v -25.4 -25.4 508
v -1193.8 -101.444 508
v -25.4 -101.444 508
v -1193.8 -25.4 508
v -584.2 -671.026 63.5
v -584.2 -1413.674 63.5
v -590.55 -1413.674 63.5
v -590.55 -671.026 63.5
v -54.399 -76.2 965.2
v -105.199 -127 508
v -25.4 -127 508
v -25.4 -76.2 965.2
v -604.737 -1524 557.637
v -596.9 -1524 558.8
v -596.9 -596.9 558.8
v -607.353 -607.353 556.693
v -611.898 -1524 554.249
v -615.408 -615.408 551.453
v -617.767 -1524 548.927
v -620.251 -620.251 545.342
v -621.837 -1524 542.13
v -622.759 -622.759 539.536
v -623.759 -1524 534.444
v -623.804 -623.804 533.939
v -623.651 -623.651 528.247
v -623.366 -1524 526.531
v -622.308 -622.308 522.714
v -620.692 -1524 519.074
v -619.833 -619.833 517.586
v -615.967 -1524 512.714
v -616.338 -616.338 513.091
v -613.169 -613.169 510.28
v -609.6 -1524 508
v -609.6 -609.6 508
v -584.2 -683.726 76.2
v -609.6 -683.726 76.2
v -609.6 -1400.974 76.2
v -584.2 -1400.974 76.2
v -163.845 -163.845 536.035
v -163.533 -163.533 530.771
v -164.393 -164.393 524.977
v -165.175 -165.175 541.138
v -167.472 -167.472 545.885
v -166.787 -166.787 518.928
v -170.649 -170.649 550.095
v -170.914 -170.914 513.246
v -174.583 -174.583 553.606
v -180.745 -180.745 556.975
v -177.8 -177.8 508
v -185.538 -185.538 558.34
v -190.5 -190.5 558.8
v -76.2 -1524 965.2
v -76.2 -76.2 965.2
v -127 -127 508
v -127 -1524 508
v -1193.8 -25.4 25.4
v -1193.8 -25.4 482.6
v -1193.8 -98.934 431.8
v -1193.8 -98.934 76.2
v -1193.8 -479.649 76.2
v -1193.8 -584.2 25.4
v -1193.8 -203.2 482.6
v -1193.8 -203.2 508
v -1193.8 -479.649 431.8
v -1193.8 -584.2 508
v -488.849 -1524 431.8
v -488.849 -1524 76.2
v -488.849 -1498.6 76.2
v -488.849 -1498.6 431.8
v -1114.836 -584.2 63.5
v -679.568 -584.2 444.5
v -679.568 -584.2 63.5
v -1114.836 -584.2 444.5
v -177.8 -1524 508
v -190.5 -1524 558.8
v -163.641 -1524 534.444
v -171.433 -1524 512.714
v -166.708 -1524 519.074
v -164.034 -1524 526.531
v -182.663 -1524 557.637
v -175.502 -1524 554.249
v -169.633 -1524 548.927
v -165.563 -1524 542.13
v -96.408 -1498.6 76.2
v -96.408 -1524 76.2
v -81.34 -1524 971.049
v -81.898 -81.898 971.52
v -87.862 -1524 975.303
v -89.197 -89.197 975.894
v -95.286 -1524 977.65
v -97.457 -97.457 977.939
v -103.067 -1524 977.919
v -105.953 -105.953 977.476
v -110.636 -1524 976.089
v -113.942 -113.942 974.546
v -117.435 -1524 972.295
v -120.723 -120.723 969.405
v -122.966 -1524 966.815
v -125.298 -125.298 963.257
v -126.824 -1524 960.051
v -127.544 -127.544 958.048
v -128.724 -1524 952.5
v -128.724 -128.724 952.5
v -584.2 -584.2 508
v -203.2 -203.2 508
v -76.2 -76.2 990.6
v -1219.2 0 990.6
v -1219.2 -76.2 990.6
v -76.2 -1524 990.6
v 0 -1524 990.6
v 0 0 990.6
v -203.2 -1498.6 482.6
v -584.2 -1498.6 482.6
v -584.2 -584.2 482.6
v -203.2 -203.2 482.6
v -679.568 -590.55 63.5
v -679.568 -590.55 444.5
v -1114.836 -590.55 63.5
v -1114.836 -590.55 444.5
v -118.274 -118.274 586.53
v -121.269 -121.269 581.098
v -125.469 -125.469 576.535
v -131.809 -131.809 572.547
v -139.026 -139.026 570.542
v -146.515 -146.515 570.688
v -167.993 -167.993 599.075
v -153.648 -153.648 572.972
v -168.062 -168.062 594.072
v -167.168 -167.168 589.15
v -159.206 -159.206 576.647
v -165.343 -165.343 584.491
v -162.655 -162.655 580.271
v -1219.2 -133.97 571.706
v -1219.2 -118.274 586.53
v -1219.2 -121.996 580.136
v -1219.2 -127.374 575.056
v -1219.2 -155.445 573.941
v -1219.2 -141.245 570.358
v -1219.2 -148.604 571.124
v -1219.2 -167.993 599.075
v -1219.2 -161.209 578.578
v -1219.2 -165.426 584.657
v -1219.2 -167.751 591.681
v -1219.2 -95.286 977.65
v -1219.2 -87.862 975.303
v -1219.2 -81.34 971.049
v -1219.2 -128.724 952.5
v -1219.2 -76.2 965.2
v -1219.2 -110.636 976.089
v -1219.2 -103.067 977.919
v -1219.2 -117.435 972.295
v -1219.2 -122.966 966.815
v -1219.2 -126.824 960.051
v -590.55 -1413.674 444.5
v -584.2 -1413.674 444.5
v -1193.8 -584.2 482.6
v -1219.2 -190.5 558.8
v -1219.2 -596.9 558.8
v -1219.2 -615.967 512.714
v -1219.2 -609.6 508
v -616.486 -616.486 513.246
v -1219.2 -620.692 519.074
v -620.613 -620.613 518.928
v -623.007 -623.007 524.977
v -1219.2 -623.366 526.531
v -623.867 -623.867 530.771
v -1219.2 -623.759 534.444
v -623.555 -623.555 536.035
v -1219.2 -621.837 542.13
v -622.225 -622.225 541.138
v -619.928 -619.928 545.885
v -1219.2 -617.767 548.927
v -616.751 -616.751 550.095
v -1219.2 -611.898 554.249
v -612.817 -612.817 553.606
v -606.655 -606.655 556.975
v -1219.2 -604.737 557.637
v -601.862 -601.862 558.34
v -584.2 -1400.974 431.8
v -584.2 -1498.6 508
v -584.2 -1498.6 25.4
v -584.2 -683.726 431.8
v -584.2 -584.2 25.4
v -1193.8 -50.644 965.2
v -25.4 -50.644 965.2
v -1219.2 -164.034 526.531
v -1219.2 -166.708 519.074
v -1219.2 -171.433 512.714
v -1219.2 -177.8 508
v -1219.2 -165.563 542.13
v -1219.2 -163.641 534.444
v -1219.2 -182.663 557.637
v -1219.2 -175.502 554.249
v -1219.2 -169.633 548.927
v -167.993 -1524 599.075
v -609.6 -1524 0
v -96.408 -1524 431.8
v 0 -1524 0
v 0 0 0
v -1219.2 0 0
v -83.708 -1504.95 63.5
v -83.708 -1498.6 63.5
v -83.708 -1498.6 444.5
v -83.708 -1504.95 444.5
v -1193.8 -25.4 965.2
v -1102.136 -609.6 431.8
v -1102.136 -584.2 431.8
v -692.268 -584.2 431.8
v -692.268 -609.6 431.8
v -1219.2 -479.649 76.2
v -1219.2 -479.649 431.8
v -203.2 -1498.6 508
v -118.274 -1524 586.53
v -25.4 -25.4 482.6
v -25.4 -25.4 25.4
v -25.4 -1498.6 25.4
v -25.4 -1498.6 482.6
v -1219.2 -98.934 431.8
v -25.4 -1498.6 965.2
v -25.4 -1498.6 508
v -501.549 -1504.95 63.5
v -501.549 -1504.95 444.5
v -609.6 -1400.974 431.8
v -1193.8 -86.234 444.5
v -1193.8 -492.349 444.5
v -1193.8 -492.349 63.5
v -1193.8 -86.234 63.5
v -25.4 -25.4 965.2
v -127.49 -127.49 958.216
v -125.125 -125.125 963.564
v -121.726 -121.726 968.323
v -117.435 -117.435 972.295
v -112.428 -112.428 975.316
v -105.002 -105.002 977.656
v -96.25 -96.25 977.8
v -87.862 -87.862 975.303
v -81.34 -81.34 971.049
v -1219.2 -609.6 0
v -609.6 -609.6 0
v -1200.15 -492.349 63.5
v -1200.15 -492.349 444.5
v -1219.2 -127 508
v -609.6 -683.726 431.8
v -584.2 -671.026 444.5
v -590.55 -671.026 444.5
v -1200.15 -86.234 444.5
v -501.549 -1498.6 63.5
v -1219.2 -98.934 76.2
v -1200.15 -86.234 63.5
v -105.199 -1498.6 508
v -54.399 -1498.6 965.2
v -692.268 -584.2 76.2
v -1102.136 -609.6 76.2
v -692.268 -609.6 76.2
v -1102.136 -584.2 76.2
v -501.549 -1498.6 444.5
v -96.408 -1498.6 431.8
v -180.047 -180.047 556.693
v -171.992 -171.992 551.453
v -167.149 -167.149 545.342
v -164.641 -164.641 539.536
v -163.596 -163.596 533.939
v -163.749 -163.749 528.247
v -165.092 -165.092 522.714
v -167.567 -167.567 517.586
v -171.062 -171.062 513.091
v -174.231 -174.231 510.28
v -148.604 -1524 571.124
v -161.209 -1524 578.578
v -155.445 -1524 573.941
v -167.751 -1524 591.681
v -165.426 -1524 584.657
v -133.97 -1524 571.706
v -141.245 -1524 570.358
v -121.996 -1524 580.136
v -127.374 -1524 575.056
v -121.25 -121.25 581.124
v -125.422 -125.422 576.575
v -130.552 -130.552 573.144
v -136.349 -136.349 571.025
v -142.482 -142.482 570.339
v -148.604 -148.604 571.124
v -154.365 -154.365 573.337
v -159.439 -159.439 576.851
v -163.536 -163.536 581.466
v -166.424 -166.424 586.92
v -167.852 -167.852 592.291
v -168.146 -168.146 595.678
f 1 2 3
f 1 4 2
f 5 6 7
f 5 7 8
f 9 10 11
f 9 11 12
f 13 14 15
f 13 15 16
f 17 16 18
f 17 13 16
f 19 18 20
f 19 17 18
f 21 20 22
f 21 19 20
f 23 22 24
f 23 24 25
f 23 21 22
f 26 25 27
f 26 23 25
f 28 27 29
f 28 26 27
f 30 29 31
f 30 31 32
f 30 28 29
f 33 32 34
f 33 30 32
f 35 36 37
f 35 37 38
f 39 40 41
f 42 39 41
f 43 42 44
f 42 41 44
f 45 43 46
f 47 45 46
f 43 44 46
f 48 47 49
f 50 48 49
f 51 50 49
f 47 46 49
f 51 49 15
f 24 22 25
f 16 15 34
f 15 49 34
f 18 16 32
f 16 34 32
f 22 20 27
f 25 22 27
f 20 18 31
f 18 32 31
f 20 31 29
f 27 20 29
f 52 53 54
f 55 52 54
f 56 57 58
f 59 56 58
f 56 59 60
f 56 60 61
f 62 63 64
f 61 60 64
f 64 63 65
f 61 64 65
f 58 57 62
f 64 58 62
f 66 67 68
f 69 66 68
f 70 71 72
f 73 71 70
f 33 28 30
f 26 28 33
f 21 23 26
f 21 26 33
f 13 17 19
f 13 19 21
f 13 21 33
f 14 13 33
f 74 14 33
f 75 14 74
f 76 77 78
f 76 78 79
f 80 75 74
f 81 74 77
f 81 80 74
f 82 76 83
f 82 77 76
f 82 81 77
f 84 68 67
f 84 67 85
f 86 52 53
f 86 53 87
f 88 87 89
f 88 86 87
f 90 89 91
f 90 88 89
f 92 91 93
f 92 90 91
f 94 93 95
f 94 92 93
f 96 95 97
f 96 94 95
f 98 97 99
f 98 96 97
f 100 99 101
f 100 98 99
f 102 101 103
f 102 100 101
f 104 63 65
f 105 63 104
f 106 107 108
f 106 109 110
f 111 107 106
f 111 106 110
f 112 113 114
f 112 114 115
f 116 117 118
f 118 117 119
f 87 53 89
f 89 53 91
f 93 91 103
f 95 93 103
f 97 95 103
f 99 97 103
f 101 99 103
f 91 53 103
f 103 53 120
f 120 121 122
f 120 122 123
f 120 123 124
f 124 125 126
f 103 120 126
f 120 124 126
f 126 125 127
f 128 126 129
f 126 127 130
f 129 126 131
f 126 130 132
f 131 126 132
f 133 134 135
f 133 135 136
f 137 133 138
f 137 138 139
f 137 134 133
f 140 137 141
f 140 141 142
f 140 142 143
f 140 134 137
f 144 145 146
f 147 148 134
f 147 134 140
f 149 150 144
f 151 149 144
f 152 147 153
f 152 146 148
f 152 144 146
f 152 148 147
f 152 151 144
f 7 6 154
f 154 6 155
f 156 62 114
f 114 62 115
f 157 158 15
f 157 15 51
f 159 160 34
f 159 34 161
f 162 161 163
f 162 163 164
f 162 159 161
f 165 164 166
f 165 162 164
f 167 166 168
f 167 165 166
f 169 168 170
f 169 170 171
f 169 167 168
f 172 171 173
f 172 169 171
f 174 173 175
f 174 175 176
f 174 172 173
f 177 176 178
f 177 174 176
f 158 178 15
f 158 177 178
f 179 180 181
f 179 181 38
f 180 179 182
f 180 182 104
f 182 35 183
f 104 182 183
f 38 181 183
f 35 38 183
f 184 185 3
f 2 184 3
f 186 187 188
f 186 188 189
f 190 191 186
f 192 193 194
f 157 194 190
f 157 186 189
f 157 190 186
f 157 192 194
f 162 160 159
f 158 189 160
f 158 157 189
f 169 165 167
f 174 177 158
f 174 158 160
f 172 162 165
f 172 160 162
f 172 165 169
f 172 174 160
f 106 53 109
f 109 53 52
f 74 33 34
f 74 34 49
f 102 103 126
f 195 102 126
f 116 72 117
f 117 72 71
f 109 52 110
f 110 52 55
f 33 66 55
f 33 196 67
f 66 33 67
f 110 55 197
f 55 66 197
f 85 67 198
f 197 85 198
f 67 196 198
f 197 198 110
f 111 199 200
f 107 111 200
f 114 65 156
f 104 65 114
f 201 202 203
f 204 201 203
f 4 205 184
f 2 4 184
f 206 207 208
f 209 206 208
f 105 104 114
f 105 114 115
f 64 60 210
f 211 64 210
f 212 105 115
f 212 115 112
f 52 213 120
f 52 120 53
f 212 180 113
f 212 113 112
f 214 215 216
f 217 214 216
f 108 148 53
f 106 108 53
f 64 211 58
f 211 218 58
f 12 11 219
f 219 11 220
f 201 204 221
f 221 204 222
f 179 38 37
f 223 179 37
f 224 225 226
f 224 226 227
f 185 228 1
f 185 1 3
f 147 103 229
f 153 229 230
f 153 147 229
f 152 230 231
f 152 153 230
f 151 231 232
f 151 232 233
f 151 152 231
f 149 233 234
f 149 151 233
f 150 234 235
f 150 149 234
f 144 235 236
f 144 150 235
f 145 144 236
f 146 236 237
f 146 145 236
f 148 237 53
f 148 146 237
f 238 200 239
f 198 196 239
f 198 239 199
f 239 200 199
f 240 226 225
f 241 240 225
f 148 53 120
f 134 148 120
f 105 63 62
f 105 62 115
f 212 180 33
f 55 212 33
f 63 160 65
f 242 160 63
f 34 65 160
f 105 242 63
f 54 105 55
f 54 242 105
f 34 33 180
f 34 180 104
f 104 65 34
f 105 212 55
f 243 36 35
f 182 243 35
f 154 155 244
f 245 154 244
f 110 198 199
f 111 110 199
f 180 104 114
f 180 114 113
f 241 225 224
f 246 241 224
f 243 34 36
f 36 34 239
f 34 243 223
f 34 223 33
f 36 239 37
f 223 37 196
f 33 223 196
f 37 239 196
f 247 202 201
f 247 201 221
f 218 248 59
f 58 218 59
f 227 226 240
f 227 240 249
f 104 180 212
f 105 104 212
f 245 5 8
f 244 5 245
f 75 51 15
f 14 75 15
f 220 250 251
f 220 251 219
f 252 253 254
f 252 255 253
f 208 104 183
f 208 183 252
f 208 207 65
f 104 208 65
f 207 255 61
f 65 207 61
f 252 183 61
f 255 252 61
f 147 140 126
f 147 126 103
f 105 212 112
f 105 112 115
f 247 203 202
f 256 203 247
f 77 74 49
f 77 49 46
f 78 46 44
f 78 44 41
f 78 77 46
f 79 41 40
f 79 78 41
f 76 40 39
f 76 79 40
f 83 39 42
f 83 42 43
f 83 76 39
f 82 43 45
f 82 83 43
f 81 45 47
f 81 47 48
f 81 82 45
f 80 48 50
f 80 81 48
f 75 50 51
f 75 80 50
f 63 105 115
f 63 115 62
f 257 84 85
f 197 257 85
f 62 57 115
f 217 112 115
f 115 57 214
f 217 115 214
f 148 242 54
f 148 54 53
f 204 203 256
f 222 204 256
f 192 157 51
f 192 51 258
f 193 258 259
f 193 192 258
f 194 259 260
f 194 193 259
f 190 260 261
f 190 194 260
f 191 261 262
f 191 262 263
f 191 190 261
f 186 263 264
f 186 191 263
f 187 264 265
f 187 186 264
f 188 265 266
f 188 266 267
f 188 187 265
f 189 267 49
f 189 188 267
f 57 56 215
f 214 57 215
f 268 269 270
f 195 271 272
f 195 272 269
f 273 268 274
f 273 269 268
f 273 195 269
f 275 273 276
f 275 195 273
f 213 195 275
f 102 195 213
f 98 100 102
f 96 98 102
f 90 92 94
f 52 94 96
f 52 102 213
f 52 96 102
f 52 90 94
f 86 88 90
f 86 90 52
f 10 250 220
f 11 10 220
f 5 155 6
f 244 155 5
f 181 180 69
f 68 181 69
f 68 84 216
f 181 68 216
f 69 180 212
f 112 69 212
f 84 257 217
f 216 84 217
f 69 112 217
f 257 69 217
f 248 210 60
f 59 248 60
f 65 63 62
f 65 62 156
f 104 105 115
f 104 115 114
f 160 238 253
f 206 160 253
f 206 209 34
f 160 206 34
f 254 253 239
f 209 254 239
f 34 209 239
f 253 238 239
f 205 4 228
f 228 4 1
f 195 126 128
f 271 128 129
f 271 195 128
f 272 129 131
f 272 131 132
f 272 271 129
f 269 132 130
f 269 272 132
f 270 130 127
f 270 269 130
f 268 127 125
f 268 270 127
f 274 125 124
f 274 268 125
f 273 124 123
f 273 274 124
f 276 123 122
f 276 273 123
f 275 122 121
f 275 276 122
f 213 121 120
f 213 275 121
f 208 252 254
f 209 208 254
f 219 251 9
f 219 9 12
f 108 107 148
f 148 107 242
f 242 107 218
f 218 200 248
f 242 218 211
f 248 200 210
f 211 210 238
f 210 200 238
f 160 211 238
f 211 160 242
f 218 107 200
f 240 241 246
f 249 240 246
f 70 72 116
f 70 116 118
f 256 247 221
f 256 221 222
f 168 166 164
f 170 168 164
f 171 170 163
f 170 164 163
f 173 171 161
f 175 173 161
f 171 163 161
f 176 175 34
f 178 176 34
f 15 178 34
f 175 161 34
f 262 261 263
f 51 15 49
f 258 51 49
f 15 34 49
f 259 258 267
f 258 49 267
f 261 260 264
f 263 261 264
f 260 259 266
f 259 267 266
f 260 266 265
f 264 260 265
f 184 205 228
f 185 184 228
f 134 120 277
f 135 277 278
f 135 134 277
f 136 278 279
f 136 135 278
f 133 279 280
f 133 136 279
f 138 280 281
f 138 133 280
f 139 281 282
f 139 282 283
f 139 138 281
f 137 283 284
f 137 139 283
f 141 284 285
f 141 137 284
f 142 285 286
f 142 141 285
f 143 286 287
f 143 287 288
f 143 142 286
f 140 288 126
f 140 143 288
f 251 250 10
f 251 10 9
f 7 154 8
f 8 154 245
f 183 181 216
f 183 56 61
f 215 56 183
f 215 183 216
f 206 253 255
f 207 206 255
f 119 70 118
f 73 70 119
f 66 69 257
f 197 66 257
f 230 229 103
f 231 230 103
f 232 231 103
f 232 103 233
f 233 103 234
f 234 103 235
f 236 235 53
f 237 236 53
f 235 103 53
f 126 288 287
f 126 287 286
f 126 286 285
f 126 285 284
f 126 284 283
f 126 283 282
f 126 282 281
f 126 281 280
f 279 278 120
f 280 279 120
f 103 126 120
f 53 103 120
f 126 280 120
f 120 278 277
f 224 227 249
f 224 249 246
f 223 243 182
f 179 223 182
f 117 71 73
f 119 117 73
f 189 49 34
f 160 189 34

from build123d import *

# Parameters (mm, degrees)
F1_DEPTH  = 76.2
F2_DEPTH  = 25.4
F3_W      = 1168.4
F3_H      = 25.4
F4_DEPTH  = 889
F5_DEPTH  = 355.6
F7_DEPTH  = 76.2
F9_DEPTH  = 25.4
F11_DEPTH = 25.4
F13_DEPTH = 25.4
F14_DEPTH = 1193.8
F15_REACH = 1986.929480867
F16_W     = 406.1148560882
F16_H     = 381
F16_W_2   = 380.7148560882
F16_H_2   = 355.6
F17_DEPTH = 6.35
F18_W     = 435.2687171936
F18_H     = 381
F18_W_2   = 409.8687171936
F18_H_2   = 355.6
F19_DEPTH = 6.35
F20_W     = 742.6479629517
F20_H     = 381
F20_W_2   = 717.2479629517
F20_H_2   = 355.6
F21_DEPTH = 6.35
F22_W     = 417.8407884479
F22_H     = 381
F22_W_2   = 392.4407884479
F22_H_2   = 355.6
F23_DEPTH = 6.35
F25_DEPTH = 25.4
F26_DEPTH = 25.4
F28_REACH = 1987.1702785851
F30_REACH = 1682.3702785851
F32_DEPTH = 25.4


with BuildPart() as f1:
    # F0 (on Top) → F1 (new body)
    with BuildSketch(Plane.XY):
        Polygon((0, -1524), (0, 0), (-1219.2, 0), (-1219.2, -127), (-1219.2, -609.6), (-609.6, -609.6), (-609.6, -1524), (-127, -1524), align=None)
        Polygon((-584.2, -584.2), (-1193.8, -584.2), (-1193.8, -25.4), (-25.4, -25.4), (-25.4, -1498.6), (-584.2, -1498.6), align=None, mode=Mode.SUBTRACT)
    extrude(amount=F1_DEPTH)

    # F0 (on Top) → F2 (join)
    with BuildSketch(Plane.XY):
        Polygon((0, -1524), (0, 0), (-1219.2, 0), (-1219.2, -127), (-1219.2, -609.6), (-609.6, -609.6), (-609.6, -1524), (-127, -1524), align=None)
        Polygon((-584.2, -584.2), (-1193.8, -584.2), (-1193.8, -25.4), (-25.4, -25.4), (-25.4, -1498.6), (-584.2, -1498.6), align=None, mode=Mode.SUBTRACT)
        Polygon((-1193.8, -25.4), (-1193.8, -584.2), (-584.2, -584.2), (-584.2, -1498.6), (-25.4, -1498.6), (-25.4, -25.4), align=None)
    extrude(amount=F2_DEPTH)

    # F3 (on face) → F4 (join)
    with BuildSketch(Plane.XY.offset(76.2)):
        with Locations((-609.6, -12.7)):
            Rectangle(F3_W, F3_H)
        Polygon((-25.4, 0), (-25.4, -25.4), (-25.4, -1498.6), (0, -1498.6), (0, 0), align=None)
    extrude(amount=F4_DEPTH)

    # F3 (on face) → F5 (join)
    with BuildSketch(Plane.XY.offset(76.2)):
        Polygon((-1219.2, -479.6493053436), (-1219.2, -609.6), (-1102.1362543106, -609.6), (-1102.1362543106, -584.2), (-1193.8, -584.2), (-1193.8, -479.6493053436), align=None)
        Polygon((-1219.2, 0), (-1219.2, -98.9344492555), (-1193.8, -98.9344492555), (-1193.8, -25.4), (-1193.8, 0), align=None)
        Polygon((-692.267537117, -584.2), (-692.267537117, -609.6), (-609.6, -609.6), (-609.6, -683.7261915207), (-584.2, -683.7261915207), (-584.2, -584.2), align=None)
        Polygon((-584.2, -1400.9741544724), (-609.6, -1400.9741544724), (-609.6, -1524), (-488.8490438461, -1524), (-488.8490438461, -1498.6), (-584.2, -1498.6), align=None)
        Polygon((0, -1498.6), (-25.4, -1498.6), (-96.4082553983, -1498.6), (-96.4082553983, -1524), (0, -1524), align=None)
    extrude(amount=F5_DEPTH)

    # F6 (on face) → F7 (join)
    with BuildSketch(Plane.XY.offset(431.8)):
        Polygon((-692.267537117, -609.6), (-692.267537117, -584.2), (-1193.8, -584.2), (-1193.8, 0), (-1219.2, 0), (-1219.2, -609.6), align=None)
        Polygon((-584.2, -683.7261915207), (-584.2, -584.2), (-692.267537117, -584.2), (-692.267537117, -609.6), (-609.6, -609.6), (-609.6, -683.7261915207), align=None)
        Polygon((-584.2, -1498.6), (-584.2, -683.7261915207), (-609.6, -683.7261915207), (-609.6, -1524), (0, -1524), (0, -1498.6), align=None)
    extrude(amount=F7_DEPTH)

    # F8 (on face) → F9 (join)
    with BuildSketch(Plane.XZ.offset(1524)):
        Polygon((0, 508), (0, 965.2), (-54.3987713754, 965.2), (-105.1987713754, 508), align=None)
        Polygon((-105.1987713754, 508), (-54.3987713754, 965.2), (-76.2, 965.2), (-127, 508), align=None)
    extrude(amount=-F9_DEPTH)

    # F10 (on face) → F11 (join)
    with BuildSketch(Plane(origin=(-1219.2, 0, 0), x_dir=(0, -1, 0), z_dir=(-1, 0, 0))):
        Polygon((50.6436908324, 965.2), (0, 965.2), (0, 508), (101.4436908324, 508), align=None)
        Polygon((76.2, 965.2), (50.6436908324, 965.2), (101.4436908324, 508), (127, 508), align=None)
    extrude(amount=-F11_DEPTH)

    # F12 (on face) → F13 (join)
    with BuildSketch(Plane.XY.offset(508)):
        Polygon((-1193.8, 0), (-1193.8, -203.2), (-203.2, -203.2), (-203.2, -1498.6), (0, -1498.6), (0, 0), align=None)
    extrude(amount=-F13_DEPTH)

    # F10 (on face) → F14 (join, through all)
    with BuildSketch(Plane(origin=(-1219.2, 0, 0), x_dir=(0, -1, 0), z_dir=(-1, 0, 0))):
        Polygon((76.2, 965.2), (50.6436908324, 965.2), (101.4436908324, 508), (127, 508), align=None)
    extrude(amount=-F14_DEPTH)

    f15_end = f1.faces().sort_by_distance((-622.3, -101.6, 736.6))[0]
    # F8 (on face) → F15 (join, up to a face of the model that its end follows)
    with BuildSketch(Plane.XZ.offset(1524)):
        Polygon((-105.1987713754, 508), (-54.3987713754, 965.2), (-76.2, 965.2), (-127, 508), align=None)
    f15_long = extrude(amount=-F15_REACH, mode=Mode.PRIVATE)
    add(split(f15_long, bisect_by=f15_end, keep=Keep.TOP, mode=Mode.PRIVATE))

    # F31 (on face) → F32 (join)
    with BuildSketch(Plane.XY.offset(965.2)):
        Polygon((0, 0), (-1219.2, 0), (-1219.2, -76.2), (-76.2, -76.2), (-76.2, -1524), (0, -1524), align=None)
    extrude(amount=F32_DEPTH)


with BuildPart() as f17:
    # F16 (on face) → F17 (new body)
    with BuildSketch(Plane.YZ.offset(-1193.8)):
        with Locations((-289.2918772995, 254)):
            Rectangle(F16_W, F16_H)
        with Locations((-289.2918772995, 254)):
            Rectangle(F16_W_2, F16_H_2, mode=Mode.SUBTRACT)
        with Locations((-289.2918772995, 254)):
            Rectangle(F16_W_2, F16_H_2)
    extrude(amount=-F17_DEPTH)


with BuildPart() as f19:
    # F18 (on face) → F19 (new body)
    with BuildSketch(Plane(origin=(0, -584.2, 0), x_dir=(-1, 0, 0), z_dir=(0, 1, 0))):
        with Locations((897.2018957138, 254)):
            Rectangle(F18_W, F18_H)
        with Locations((897.2018957138, 254)):
            Rectangle(F18_W_2, F18_H_2, mode=Mode.SUBTRACT)
        with Locations((897.2018957138, 254)):
            Rectangle(F18_W_2, F18_H_2)
    extrude(amount=-F19_DEPTH)


with BuildPart() as f21:
    # F20 (on face) → F21 (new body)
    with BuildSketch(Plane.YZ.offset(-584.2)):
        with Locations((-1042.3501729965, 254)):
            Rectangle(F20_W, F20_H)
        with Locations((-1042.3501729965, 254)):
            Rectangle(F20_W_2, F20_H_2, mode=Mode.SUBTRACT)
        with Locations((-1042.3501729965, 254)):
            Rectangle(F20_W_2, F20_H_2)
    extrude(amount=-F21_DEPTH)


with BuildPart() as f23:
    # F22 (on face) → F23 (new body)
    with BuildSketch(Plane(origin=(0, -1498.6, 0), x_dir=(-1, 0, 0), z_dir=(0, 1, 0))):
        with Locations((292.6286496222, 254)):
            Rectangle(F22_W, F22_H)
        with Locations((292.6286496222, 254)):
            Rectangle(F22_W_2, F22_H_2, mode=Mode.SUBTRACT)
        with Locations((292.6286496222, 254)):
            Rectangle(F22_W_2, F22_H_2)
    extrude(amount=-F23_DEPTH)


with BuildPart() as f25:
    # F24 (on face) → F25 (new body)
    with BuildSketch(Plane.XY.offset(508)):
        Polygon((-203.2, -203.2), (-1193.8, -203.2), (-1193.8, -584.2), (-584.2, -584.2), align=None)
    extrude(amount=-F25_DEPTH)


with BuildPart() as f26:
    # F24 (on face) → F26 (new body)
    with BuildSketch(Plane.XY.offset(508)):
        Polygon((-203.2, -1498.6), (-203.2, -203.2), (-584.2, -584.2), (-584.2, -1498.6), align=None)
    extrude(amount=-F26_DEPTH)


with BuildPart() as f28:
    f28_end = Plane(origin=(-393.7, -393.7, 495.3), x_dir=(-0.7071067812, -0.7071067812, 0), z_dir=(0.7071067812, -0.7071067812, 0))
    # F27 (on face) → F28 (new body, up to a plane its end follows)
    with BuildSketch(Plane.XZ.offset(1524)):
        with BuildLine():
            ThreePointArc((-596.9, 558.8), (-623.0817207227, 538.3579301807), (-609.6, 508))
            Line((-609.6, 508), (-177.8, 508))
            ThreePointArc((-177.8, 508), (-164.3182792773, 538.3579301807), (-190.5, 558.8))
            Line((-190.5, 558.8), (-596.9, 558.8))
        make_face()
    f28_long = extrude(amount=-F28_REACH, mode=Mode.PRIVATE)
    add(split(f28_long, bisect_by=f28_end, keep=Keep.TOP, mode=Mode.PRIVATE))


with BuildPart() as f28b:
    f28_2_end = Plane(origin=(-393.7, -393.7, 495.3), x_dir=(-0.7071067812, -0.7071067812, 0), z_dir=(0.7071067812, -0.7071067812, 0))
    # F27 (on face) → F28, piece 2 (new body, up to a plane its end follows)
    with BuildSketch(Plane.XZ.offset(1524)):
        with BuildLine():
            ThreePointArc((-167.9931801186, 599.0749439501), (-148.6035006779, 571.1242906487), (-118.2744114345, 586.5302970894))
            Line((-118.2744114345, 586.5302970894), (-76.2, 965.2))
            ThreePointArc((-76.2, 965.2), (-106.9137050785, 977.2615951465), (-128.7237294464, 952.5))
            Line((-128.7237294464, 952.5), (-167.9931801186, 599.0749439501))
        make_face()
    f28_2_long = extrude(amount=-F28_REACH, mode=Mode.PRIVATE)
    add(split(f28_2_long, bisect_by=f28_2_end, keep=Keep.TOP, mode=Mode.PRIVATE))


with BuildPart() as f30:
    f30_end = Plane(origin=(-393.7, -393.7, 495.3), x_dir=(0.7071067812, 0.7071067812, 0), z_dir=(-0.7071067812, 0.7071067812, 0))
    # F29 (on face) → F30 (new body, up to a plane its end follows)
    with BuildSketch(Plane(origin=(-1219.2, 0, 0), x_dir=(0, -1, 0), z_dir=(-1, 0, 0))):
        with BuildLine():
            Line((177.8, 508), (609.6, 508))
            ThreePointArc((609.6, 508), (623.0817207227, 538.3579301807), (596.9, 558.8))
            Line((596.9, 558.8), (190.5, 558.8))
            ThreePointArc((190.5, 558.8), (164.3182792773, 538.3579301807), (177.8, 508))
        make_face()
    f30_long = extrude(amount=-F30_REACH, mode=Mode.PRIVATE)
    add(split(f30_long, bisect_by=f30_end, keep=Keep.TOP, mode=Mode.PRIVATE))


with BuildPart() as f30b:
    f30_2_end = Plane(origin=(-393.7, -393.7, 495.3), x_dir=(0.7071067812, 0.7071067812, 0), z_dir=(-0.7071067812, 0.7071067812, 0))
    # F29 (on face) → F30, piece 2 (new body, up to a plane its end follows)
    with BuildSketch(Plane(origin=(-1219.2, 0, 0), x_dir=(0, -1, 0), z_dir=(-1, 0, 0))):
        with BuildLine():
            Line((76.2, 965.2), (118.2744114345, 586.5302970894))
            ThreePointArc((118.2744114345, 586.5302970894), (148.6035006779, 571.1242906487), (167.9931801186, 599.0749439501))
            Line((167.9931801186, 599.0749439501), (128.7237294464, 952.5))
            ThreePointArc((128.7237294464, 952.5), (106.9137050785, 977.2615951465), (76.2, 965.2))
        make_face()
    f30_2_long = extrude(amount=-F30_REACH, mode=Mode.PRIVATE)
    add(split(f30_2_long, bisect_by=f30_2_end, keep=Keep.TOP, mode=Mode.PRIVATE))


solid = Compound([f1.part, f17.part, f19.part, f21.part, f23.part, f25.part, f26.part, f28.part, f28b.part, f30.part, f30b.part])
